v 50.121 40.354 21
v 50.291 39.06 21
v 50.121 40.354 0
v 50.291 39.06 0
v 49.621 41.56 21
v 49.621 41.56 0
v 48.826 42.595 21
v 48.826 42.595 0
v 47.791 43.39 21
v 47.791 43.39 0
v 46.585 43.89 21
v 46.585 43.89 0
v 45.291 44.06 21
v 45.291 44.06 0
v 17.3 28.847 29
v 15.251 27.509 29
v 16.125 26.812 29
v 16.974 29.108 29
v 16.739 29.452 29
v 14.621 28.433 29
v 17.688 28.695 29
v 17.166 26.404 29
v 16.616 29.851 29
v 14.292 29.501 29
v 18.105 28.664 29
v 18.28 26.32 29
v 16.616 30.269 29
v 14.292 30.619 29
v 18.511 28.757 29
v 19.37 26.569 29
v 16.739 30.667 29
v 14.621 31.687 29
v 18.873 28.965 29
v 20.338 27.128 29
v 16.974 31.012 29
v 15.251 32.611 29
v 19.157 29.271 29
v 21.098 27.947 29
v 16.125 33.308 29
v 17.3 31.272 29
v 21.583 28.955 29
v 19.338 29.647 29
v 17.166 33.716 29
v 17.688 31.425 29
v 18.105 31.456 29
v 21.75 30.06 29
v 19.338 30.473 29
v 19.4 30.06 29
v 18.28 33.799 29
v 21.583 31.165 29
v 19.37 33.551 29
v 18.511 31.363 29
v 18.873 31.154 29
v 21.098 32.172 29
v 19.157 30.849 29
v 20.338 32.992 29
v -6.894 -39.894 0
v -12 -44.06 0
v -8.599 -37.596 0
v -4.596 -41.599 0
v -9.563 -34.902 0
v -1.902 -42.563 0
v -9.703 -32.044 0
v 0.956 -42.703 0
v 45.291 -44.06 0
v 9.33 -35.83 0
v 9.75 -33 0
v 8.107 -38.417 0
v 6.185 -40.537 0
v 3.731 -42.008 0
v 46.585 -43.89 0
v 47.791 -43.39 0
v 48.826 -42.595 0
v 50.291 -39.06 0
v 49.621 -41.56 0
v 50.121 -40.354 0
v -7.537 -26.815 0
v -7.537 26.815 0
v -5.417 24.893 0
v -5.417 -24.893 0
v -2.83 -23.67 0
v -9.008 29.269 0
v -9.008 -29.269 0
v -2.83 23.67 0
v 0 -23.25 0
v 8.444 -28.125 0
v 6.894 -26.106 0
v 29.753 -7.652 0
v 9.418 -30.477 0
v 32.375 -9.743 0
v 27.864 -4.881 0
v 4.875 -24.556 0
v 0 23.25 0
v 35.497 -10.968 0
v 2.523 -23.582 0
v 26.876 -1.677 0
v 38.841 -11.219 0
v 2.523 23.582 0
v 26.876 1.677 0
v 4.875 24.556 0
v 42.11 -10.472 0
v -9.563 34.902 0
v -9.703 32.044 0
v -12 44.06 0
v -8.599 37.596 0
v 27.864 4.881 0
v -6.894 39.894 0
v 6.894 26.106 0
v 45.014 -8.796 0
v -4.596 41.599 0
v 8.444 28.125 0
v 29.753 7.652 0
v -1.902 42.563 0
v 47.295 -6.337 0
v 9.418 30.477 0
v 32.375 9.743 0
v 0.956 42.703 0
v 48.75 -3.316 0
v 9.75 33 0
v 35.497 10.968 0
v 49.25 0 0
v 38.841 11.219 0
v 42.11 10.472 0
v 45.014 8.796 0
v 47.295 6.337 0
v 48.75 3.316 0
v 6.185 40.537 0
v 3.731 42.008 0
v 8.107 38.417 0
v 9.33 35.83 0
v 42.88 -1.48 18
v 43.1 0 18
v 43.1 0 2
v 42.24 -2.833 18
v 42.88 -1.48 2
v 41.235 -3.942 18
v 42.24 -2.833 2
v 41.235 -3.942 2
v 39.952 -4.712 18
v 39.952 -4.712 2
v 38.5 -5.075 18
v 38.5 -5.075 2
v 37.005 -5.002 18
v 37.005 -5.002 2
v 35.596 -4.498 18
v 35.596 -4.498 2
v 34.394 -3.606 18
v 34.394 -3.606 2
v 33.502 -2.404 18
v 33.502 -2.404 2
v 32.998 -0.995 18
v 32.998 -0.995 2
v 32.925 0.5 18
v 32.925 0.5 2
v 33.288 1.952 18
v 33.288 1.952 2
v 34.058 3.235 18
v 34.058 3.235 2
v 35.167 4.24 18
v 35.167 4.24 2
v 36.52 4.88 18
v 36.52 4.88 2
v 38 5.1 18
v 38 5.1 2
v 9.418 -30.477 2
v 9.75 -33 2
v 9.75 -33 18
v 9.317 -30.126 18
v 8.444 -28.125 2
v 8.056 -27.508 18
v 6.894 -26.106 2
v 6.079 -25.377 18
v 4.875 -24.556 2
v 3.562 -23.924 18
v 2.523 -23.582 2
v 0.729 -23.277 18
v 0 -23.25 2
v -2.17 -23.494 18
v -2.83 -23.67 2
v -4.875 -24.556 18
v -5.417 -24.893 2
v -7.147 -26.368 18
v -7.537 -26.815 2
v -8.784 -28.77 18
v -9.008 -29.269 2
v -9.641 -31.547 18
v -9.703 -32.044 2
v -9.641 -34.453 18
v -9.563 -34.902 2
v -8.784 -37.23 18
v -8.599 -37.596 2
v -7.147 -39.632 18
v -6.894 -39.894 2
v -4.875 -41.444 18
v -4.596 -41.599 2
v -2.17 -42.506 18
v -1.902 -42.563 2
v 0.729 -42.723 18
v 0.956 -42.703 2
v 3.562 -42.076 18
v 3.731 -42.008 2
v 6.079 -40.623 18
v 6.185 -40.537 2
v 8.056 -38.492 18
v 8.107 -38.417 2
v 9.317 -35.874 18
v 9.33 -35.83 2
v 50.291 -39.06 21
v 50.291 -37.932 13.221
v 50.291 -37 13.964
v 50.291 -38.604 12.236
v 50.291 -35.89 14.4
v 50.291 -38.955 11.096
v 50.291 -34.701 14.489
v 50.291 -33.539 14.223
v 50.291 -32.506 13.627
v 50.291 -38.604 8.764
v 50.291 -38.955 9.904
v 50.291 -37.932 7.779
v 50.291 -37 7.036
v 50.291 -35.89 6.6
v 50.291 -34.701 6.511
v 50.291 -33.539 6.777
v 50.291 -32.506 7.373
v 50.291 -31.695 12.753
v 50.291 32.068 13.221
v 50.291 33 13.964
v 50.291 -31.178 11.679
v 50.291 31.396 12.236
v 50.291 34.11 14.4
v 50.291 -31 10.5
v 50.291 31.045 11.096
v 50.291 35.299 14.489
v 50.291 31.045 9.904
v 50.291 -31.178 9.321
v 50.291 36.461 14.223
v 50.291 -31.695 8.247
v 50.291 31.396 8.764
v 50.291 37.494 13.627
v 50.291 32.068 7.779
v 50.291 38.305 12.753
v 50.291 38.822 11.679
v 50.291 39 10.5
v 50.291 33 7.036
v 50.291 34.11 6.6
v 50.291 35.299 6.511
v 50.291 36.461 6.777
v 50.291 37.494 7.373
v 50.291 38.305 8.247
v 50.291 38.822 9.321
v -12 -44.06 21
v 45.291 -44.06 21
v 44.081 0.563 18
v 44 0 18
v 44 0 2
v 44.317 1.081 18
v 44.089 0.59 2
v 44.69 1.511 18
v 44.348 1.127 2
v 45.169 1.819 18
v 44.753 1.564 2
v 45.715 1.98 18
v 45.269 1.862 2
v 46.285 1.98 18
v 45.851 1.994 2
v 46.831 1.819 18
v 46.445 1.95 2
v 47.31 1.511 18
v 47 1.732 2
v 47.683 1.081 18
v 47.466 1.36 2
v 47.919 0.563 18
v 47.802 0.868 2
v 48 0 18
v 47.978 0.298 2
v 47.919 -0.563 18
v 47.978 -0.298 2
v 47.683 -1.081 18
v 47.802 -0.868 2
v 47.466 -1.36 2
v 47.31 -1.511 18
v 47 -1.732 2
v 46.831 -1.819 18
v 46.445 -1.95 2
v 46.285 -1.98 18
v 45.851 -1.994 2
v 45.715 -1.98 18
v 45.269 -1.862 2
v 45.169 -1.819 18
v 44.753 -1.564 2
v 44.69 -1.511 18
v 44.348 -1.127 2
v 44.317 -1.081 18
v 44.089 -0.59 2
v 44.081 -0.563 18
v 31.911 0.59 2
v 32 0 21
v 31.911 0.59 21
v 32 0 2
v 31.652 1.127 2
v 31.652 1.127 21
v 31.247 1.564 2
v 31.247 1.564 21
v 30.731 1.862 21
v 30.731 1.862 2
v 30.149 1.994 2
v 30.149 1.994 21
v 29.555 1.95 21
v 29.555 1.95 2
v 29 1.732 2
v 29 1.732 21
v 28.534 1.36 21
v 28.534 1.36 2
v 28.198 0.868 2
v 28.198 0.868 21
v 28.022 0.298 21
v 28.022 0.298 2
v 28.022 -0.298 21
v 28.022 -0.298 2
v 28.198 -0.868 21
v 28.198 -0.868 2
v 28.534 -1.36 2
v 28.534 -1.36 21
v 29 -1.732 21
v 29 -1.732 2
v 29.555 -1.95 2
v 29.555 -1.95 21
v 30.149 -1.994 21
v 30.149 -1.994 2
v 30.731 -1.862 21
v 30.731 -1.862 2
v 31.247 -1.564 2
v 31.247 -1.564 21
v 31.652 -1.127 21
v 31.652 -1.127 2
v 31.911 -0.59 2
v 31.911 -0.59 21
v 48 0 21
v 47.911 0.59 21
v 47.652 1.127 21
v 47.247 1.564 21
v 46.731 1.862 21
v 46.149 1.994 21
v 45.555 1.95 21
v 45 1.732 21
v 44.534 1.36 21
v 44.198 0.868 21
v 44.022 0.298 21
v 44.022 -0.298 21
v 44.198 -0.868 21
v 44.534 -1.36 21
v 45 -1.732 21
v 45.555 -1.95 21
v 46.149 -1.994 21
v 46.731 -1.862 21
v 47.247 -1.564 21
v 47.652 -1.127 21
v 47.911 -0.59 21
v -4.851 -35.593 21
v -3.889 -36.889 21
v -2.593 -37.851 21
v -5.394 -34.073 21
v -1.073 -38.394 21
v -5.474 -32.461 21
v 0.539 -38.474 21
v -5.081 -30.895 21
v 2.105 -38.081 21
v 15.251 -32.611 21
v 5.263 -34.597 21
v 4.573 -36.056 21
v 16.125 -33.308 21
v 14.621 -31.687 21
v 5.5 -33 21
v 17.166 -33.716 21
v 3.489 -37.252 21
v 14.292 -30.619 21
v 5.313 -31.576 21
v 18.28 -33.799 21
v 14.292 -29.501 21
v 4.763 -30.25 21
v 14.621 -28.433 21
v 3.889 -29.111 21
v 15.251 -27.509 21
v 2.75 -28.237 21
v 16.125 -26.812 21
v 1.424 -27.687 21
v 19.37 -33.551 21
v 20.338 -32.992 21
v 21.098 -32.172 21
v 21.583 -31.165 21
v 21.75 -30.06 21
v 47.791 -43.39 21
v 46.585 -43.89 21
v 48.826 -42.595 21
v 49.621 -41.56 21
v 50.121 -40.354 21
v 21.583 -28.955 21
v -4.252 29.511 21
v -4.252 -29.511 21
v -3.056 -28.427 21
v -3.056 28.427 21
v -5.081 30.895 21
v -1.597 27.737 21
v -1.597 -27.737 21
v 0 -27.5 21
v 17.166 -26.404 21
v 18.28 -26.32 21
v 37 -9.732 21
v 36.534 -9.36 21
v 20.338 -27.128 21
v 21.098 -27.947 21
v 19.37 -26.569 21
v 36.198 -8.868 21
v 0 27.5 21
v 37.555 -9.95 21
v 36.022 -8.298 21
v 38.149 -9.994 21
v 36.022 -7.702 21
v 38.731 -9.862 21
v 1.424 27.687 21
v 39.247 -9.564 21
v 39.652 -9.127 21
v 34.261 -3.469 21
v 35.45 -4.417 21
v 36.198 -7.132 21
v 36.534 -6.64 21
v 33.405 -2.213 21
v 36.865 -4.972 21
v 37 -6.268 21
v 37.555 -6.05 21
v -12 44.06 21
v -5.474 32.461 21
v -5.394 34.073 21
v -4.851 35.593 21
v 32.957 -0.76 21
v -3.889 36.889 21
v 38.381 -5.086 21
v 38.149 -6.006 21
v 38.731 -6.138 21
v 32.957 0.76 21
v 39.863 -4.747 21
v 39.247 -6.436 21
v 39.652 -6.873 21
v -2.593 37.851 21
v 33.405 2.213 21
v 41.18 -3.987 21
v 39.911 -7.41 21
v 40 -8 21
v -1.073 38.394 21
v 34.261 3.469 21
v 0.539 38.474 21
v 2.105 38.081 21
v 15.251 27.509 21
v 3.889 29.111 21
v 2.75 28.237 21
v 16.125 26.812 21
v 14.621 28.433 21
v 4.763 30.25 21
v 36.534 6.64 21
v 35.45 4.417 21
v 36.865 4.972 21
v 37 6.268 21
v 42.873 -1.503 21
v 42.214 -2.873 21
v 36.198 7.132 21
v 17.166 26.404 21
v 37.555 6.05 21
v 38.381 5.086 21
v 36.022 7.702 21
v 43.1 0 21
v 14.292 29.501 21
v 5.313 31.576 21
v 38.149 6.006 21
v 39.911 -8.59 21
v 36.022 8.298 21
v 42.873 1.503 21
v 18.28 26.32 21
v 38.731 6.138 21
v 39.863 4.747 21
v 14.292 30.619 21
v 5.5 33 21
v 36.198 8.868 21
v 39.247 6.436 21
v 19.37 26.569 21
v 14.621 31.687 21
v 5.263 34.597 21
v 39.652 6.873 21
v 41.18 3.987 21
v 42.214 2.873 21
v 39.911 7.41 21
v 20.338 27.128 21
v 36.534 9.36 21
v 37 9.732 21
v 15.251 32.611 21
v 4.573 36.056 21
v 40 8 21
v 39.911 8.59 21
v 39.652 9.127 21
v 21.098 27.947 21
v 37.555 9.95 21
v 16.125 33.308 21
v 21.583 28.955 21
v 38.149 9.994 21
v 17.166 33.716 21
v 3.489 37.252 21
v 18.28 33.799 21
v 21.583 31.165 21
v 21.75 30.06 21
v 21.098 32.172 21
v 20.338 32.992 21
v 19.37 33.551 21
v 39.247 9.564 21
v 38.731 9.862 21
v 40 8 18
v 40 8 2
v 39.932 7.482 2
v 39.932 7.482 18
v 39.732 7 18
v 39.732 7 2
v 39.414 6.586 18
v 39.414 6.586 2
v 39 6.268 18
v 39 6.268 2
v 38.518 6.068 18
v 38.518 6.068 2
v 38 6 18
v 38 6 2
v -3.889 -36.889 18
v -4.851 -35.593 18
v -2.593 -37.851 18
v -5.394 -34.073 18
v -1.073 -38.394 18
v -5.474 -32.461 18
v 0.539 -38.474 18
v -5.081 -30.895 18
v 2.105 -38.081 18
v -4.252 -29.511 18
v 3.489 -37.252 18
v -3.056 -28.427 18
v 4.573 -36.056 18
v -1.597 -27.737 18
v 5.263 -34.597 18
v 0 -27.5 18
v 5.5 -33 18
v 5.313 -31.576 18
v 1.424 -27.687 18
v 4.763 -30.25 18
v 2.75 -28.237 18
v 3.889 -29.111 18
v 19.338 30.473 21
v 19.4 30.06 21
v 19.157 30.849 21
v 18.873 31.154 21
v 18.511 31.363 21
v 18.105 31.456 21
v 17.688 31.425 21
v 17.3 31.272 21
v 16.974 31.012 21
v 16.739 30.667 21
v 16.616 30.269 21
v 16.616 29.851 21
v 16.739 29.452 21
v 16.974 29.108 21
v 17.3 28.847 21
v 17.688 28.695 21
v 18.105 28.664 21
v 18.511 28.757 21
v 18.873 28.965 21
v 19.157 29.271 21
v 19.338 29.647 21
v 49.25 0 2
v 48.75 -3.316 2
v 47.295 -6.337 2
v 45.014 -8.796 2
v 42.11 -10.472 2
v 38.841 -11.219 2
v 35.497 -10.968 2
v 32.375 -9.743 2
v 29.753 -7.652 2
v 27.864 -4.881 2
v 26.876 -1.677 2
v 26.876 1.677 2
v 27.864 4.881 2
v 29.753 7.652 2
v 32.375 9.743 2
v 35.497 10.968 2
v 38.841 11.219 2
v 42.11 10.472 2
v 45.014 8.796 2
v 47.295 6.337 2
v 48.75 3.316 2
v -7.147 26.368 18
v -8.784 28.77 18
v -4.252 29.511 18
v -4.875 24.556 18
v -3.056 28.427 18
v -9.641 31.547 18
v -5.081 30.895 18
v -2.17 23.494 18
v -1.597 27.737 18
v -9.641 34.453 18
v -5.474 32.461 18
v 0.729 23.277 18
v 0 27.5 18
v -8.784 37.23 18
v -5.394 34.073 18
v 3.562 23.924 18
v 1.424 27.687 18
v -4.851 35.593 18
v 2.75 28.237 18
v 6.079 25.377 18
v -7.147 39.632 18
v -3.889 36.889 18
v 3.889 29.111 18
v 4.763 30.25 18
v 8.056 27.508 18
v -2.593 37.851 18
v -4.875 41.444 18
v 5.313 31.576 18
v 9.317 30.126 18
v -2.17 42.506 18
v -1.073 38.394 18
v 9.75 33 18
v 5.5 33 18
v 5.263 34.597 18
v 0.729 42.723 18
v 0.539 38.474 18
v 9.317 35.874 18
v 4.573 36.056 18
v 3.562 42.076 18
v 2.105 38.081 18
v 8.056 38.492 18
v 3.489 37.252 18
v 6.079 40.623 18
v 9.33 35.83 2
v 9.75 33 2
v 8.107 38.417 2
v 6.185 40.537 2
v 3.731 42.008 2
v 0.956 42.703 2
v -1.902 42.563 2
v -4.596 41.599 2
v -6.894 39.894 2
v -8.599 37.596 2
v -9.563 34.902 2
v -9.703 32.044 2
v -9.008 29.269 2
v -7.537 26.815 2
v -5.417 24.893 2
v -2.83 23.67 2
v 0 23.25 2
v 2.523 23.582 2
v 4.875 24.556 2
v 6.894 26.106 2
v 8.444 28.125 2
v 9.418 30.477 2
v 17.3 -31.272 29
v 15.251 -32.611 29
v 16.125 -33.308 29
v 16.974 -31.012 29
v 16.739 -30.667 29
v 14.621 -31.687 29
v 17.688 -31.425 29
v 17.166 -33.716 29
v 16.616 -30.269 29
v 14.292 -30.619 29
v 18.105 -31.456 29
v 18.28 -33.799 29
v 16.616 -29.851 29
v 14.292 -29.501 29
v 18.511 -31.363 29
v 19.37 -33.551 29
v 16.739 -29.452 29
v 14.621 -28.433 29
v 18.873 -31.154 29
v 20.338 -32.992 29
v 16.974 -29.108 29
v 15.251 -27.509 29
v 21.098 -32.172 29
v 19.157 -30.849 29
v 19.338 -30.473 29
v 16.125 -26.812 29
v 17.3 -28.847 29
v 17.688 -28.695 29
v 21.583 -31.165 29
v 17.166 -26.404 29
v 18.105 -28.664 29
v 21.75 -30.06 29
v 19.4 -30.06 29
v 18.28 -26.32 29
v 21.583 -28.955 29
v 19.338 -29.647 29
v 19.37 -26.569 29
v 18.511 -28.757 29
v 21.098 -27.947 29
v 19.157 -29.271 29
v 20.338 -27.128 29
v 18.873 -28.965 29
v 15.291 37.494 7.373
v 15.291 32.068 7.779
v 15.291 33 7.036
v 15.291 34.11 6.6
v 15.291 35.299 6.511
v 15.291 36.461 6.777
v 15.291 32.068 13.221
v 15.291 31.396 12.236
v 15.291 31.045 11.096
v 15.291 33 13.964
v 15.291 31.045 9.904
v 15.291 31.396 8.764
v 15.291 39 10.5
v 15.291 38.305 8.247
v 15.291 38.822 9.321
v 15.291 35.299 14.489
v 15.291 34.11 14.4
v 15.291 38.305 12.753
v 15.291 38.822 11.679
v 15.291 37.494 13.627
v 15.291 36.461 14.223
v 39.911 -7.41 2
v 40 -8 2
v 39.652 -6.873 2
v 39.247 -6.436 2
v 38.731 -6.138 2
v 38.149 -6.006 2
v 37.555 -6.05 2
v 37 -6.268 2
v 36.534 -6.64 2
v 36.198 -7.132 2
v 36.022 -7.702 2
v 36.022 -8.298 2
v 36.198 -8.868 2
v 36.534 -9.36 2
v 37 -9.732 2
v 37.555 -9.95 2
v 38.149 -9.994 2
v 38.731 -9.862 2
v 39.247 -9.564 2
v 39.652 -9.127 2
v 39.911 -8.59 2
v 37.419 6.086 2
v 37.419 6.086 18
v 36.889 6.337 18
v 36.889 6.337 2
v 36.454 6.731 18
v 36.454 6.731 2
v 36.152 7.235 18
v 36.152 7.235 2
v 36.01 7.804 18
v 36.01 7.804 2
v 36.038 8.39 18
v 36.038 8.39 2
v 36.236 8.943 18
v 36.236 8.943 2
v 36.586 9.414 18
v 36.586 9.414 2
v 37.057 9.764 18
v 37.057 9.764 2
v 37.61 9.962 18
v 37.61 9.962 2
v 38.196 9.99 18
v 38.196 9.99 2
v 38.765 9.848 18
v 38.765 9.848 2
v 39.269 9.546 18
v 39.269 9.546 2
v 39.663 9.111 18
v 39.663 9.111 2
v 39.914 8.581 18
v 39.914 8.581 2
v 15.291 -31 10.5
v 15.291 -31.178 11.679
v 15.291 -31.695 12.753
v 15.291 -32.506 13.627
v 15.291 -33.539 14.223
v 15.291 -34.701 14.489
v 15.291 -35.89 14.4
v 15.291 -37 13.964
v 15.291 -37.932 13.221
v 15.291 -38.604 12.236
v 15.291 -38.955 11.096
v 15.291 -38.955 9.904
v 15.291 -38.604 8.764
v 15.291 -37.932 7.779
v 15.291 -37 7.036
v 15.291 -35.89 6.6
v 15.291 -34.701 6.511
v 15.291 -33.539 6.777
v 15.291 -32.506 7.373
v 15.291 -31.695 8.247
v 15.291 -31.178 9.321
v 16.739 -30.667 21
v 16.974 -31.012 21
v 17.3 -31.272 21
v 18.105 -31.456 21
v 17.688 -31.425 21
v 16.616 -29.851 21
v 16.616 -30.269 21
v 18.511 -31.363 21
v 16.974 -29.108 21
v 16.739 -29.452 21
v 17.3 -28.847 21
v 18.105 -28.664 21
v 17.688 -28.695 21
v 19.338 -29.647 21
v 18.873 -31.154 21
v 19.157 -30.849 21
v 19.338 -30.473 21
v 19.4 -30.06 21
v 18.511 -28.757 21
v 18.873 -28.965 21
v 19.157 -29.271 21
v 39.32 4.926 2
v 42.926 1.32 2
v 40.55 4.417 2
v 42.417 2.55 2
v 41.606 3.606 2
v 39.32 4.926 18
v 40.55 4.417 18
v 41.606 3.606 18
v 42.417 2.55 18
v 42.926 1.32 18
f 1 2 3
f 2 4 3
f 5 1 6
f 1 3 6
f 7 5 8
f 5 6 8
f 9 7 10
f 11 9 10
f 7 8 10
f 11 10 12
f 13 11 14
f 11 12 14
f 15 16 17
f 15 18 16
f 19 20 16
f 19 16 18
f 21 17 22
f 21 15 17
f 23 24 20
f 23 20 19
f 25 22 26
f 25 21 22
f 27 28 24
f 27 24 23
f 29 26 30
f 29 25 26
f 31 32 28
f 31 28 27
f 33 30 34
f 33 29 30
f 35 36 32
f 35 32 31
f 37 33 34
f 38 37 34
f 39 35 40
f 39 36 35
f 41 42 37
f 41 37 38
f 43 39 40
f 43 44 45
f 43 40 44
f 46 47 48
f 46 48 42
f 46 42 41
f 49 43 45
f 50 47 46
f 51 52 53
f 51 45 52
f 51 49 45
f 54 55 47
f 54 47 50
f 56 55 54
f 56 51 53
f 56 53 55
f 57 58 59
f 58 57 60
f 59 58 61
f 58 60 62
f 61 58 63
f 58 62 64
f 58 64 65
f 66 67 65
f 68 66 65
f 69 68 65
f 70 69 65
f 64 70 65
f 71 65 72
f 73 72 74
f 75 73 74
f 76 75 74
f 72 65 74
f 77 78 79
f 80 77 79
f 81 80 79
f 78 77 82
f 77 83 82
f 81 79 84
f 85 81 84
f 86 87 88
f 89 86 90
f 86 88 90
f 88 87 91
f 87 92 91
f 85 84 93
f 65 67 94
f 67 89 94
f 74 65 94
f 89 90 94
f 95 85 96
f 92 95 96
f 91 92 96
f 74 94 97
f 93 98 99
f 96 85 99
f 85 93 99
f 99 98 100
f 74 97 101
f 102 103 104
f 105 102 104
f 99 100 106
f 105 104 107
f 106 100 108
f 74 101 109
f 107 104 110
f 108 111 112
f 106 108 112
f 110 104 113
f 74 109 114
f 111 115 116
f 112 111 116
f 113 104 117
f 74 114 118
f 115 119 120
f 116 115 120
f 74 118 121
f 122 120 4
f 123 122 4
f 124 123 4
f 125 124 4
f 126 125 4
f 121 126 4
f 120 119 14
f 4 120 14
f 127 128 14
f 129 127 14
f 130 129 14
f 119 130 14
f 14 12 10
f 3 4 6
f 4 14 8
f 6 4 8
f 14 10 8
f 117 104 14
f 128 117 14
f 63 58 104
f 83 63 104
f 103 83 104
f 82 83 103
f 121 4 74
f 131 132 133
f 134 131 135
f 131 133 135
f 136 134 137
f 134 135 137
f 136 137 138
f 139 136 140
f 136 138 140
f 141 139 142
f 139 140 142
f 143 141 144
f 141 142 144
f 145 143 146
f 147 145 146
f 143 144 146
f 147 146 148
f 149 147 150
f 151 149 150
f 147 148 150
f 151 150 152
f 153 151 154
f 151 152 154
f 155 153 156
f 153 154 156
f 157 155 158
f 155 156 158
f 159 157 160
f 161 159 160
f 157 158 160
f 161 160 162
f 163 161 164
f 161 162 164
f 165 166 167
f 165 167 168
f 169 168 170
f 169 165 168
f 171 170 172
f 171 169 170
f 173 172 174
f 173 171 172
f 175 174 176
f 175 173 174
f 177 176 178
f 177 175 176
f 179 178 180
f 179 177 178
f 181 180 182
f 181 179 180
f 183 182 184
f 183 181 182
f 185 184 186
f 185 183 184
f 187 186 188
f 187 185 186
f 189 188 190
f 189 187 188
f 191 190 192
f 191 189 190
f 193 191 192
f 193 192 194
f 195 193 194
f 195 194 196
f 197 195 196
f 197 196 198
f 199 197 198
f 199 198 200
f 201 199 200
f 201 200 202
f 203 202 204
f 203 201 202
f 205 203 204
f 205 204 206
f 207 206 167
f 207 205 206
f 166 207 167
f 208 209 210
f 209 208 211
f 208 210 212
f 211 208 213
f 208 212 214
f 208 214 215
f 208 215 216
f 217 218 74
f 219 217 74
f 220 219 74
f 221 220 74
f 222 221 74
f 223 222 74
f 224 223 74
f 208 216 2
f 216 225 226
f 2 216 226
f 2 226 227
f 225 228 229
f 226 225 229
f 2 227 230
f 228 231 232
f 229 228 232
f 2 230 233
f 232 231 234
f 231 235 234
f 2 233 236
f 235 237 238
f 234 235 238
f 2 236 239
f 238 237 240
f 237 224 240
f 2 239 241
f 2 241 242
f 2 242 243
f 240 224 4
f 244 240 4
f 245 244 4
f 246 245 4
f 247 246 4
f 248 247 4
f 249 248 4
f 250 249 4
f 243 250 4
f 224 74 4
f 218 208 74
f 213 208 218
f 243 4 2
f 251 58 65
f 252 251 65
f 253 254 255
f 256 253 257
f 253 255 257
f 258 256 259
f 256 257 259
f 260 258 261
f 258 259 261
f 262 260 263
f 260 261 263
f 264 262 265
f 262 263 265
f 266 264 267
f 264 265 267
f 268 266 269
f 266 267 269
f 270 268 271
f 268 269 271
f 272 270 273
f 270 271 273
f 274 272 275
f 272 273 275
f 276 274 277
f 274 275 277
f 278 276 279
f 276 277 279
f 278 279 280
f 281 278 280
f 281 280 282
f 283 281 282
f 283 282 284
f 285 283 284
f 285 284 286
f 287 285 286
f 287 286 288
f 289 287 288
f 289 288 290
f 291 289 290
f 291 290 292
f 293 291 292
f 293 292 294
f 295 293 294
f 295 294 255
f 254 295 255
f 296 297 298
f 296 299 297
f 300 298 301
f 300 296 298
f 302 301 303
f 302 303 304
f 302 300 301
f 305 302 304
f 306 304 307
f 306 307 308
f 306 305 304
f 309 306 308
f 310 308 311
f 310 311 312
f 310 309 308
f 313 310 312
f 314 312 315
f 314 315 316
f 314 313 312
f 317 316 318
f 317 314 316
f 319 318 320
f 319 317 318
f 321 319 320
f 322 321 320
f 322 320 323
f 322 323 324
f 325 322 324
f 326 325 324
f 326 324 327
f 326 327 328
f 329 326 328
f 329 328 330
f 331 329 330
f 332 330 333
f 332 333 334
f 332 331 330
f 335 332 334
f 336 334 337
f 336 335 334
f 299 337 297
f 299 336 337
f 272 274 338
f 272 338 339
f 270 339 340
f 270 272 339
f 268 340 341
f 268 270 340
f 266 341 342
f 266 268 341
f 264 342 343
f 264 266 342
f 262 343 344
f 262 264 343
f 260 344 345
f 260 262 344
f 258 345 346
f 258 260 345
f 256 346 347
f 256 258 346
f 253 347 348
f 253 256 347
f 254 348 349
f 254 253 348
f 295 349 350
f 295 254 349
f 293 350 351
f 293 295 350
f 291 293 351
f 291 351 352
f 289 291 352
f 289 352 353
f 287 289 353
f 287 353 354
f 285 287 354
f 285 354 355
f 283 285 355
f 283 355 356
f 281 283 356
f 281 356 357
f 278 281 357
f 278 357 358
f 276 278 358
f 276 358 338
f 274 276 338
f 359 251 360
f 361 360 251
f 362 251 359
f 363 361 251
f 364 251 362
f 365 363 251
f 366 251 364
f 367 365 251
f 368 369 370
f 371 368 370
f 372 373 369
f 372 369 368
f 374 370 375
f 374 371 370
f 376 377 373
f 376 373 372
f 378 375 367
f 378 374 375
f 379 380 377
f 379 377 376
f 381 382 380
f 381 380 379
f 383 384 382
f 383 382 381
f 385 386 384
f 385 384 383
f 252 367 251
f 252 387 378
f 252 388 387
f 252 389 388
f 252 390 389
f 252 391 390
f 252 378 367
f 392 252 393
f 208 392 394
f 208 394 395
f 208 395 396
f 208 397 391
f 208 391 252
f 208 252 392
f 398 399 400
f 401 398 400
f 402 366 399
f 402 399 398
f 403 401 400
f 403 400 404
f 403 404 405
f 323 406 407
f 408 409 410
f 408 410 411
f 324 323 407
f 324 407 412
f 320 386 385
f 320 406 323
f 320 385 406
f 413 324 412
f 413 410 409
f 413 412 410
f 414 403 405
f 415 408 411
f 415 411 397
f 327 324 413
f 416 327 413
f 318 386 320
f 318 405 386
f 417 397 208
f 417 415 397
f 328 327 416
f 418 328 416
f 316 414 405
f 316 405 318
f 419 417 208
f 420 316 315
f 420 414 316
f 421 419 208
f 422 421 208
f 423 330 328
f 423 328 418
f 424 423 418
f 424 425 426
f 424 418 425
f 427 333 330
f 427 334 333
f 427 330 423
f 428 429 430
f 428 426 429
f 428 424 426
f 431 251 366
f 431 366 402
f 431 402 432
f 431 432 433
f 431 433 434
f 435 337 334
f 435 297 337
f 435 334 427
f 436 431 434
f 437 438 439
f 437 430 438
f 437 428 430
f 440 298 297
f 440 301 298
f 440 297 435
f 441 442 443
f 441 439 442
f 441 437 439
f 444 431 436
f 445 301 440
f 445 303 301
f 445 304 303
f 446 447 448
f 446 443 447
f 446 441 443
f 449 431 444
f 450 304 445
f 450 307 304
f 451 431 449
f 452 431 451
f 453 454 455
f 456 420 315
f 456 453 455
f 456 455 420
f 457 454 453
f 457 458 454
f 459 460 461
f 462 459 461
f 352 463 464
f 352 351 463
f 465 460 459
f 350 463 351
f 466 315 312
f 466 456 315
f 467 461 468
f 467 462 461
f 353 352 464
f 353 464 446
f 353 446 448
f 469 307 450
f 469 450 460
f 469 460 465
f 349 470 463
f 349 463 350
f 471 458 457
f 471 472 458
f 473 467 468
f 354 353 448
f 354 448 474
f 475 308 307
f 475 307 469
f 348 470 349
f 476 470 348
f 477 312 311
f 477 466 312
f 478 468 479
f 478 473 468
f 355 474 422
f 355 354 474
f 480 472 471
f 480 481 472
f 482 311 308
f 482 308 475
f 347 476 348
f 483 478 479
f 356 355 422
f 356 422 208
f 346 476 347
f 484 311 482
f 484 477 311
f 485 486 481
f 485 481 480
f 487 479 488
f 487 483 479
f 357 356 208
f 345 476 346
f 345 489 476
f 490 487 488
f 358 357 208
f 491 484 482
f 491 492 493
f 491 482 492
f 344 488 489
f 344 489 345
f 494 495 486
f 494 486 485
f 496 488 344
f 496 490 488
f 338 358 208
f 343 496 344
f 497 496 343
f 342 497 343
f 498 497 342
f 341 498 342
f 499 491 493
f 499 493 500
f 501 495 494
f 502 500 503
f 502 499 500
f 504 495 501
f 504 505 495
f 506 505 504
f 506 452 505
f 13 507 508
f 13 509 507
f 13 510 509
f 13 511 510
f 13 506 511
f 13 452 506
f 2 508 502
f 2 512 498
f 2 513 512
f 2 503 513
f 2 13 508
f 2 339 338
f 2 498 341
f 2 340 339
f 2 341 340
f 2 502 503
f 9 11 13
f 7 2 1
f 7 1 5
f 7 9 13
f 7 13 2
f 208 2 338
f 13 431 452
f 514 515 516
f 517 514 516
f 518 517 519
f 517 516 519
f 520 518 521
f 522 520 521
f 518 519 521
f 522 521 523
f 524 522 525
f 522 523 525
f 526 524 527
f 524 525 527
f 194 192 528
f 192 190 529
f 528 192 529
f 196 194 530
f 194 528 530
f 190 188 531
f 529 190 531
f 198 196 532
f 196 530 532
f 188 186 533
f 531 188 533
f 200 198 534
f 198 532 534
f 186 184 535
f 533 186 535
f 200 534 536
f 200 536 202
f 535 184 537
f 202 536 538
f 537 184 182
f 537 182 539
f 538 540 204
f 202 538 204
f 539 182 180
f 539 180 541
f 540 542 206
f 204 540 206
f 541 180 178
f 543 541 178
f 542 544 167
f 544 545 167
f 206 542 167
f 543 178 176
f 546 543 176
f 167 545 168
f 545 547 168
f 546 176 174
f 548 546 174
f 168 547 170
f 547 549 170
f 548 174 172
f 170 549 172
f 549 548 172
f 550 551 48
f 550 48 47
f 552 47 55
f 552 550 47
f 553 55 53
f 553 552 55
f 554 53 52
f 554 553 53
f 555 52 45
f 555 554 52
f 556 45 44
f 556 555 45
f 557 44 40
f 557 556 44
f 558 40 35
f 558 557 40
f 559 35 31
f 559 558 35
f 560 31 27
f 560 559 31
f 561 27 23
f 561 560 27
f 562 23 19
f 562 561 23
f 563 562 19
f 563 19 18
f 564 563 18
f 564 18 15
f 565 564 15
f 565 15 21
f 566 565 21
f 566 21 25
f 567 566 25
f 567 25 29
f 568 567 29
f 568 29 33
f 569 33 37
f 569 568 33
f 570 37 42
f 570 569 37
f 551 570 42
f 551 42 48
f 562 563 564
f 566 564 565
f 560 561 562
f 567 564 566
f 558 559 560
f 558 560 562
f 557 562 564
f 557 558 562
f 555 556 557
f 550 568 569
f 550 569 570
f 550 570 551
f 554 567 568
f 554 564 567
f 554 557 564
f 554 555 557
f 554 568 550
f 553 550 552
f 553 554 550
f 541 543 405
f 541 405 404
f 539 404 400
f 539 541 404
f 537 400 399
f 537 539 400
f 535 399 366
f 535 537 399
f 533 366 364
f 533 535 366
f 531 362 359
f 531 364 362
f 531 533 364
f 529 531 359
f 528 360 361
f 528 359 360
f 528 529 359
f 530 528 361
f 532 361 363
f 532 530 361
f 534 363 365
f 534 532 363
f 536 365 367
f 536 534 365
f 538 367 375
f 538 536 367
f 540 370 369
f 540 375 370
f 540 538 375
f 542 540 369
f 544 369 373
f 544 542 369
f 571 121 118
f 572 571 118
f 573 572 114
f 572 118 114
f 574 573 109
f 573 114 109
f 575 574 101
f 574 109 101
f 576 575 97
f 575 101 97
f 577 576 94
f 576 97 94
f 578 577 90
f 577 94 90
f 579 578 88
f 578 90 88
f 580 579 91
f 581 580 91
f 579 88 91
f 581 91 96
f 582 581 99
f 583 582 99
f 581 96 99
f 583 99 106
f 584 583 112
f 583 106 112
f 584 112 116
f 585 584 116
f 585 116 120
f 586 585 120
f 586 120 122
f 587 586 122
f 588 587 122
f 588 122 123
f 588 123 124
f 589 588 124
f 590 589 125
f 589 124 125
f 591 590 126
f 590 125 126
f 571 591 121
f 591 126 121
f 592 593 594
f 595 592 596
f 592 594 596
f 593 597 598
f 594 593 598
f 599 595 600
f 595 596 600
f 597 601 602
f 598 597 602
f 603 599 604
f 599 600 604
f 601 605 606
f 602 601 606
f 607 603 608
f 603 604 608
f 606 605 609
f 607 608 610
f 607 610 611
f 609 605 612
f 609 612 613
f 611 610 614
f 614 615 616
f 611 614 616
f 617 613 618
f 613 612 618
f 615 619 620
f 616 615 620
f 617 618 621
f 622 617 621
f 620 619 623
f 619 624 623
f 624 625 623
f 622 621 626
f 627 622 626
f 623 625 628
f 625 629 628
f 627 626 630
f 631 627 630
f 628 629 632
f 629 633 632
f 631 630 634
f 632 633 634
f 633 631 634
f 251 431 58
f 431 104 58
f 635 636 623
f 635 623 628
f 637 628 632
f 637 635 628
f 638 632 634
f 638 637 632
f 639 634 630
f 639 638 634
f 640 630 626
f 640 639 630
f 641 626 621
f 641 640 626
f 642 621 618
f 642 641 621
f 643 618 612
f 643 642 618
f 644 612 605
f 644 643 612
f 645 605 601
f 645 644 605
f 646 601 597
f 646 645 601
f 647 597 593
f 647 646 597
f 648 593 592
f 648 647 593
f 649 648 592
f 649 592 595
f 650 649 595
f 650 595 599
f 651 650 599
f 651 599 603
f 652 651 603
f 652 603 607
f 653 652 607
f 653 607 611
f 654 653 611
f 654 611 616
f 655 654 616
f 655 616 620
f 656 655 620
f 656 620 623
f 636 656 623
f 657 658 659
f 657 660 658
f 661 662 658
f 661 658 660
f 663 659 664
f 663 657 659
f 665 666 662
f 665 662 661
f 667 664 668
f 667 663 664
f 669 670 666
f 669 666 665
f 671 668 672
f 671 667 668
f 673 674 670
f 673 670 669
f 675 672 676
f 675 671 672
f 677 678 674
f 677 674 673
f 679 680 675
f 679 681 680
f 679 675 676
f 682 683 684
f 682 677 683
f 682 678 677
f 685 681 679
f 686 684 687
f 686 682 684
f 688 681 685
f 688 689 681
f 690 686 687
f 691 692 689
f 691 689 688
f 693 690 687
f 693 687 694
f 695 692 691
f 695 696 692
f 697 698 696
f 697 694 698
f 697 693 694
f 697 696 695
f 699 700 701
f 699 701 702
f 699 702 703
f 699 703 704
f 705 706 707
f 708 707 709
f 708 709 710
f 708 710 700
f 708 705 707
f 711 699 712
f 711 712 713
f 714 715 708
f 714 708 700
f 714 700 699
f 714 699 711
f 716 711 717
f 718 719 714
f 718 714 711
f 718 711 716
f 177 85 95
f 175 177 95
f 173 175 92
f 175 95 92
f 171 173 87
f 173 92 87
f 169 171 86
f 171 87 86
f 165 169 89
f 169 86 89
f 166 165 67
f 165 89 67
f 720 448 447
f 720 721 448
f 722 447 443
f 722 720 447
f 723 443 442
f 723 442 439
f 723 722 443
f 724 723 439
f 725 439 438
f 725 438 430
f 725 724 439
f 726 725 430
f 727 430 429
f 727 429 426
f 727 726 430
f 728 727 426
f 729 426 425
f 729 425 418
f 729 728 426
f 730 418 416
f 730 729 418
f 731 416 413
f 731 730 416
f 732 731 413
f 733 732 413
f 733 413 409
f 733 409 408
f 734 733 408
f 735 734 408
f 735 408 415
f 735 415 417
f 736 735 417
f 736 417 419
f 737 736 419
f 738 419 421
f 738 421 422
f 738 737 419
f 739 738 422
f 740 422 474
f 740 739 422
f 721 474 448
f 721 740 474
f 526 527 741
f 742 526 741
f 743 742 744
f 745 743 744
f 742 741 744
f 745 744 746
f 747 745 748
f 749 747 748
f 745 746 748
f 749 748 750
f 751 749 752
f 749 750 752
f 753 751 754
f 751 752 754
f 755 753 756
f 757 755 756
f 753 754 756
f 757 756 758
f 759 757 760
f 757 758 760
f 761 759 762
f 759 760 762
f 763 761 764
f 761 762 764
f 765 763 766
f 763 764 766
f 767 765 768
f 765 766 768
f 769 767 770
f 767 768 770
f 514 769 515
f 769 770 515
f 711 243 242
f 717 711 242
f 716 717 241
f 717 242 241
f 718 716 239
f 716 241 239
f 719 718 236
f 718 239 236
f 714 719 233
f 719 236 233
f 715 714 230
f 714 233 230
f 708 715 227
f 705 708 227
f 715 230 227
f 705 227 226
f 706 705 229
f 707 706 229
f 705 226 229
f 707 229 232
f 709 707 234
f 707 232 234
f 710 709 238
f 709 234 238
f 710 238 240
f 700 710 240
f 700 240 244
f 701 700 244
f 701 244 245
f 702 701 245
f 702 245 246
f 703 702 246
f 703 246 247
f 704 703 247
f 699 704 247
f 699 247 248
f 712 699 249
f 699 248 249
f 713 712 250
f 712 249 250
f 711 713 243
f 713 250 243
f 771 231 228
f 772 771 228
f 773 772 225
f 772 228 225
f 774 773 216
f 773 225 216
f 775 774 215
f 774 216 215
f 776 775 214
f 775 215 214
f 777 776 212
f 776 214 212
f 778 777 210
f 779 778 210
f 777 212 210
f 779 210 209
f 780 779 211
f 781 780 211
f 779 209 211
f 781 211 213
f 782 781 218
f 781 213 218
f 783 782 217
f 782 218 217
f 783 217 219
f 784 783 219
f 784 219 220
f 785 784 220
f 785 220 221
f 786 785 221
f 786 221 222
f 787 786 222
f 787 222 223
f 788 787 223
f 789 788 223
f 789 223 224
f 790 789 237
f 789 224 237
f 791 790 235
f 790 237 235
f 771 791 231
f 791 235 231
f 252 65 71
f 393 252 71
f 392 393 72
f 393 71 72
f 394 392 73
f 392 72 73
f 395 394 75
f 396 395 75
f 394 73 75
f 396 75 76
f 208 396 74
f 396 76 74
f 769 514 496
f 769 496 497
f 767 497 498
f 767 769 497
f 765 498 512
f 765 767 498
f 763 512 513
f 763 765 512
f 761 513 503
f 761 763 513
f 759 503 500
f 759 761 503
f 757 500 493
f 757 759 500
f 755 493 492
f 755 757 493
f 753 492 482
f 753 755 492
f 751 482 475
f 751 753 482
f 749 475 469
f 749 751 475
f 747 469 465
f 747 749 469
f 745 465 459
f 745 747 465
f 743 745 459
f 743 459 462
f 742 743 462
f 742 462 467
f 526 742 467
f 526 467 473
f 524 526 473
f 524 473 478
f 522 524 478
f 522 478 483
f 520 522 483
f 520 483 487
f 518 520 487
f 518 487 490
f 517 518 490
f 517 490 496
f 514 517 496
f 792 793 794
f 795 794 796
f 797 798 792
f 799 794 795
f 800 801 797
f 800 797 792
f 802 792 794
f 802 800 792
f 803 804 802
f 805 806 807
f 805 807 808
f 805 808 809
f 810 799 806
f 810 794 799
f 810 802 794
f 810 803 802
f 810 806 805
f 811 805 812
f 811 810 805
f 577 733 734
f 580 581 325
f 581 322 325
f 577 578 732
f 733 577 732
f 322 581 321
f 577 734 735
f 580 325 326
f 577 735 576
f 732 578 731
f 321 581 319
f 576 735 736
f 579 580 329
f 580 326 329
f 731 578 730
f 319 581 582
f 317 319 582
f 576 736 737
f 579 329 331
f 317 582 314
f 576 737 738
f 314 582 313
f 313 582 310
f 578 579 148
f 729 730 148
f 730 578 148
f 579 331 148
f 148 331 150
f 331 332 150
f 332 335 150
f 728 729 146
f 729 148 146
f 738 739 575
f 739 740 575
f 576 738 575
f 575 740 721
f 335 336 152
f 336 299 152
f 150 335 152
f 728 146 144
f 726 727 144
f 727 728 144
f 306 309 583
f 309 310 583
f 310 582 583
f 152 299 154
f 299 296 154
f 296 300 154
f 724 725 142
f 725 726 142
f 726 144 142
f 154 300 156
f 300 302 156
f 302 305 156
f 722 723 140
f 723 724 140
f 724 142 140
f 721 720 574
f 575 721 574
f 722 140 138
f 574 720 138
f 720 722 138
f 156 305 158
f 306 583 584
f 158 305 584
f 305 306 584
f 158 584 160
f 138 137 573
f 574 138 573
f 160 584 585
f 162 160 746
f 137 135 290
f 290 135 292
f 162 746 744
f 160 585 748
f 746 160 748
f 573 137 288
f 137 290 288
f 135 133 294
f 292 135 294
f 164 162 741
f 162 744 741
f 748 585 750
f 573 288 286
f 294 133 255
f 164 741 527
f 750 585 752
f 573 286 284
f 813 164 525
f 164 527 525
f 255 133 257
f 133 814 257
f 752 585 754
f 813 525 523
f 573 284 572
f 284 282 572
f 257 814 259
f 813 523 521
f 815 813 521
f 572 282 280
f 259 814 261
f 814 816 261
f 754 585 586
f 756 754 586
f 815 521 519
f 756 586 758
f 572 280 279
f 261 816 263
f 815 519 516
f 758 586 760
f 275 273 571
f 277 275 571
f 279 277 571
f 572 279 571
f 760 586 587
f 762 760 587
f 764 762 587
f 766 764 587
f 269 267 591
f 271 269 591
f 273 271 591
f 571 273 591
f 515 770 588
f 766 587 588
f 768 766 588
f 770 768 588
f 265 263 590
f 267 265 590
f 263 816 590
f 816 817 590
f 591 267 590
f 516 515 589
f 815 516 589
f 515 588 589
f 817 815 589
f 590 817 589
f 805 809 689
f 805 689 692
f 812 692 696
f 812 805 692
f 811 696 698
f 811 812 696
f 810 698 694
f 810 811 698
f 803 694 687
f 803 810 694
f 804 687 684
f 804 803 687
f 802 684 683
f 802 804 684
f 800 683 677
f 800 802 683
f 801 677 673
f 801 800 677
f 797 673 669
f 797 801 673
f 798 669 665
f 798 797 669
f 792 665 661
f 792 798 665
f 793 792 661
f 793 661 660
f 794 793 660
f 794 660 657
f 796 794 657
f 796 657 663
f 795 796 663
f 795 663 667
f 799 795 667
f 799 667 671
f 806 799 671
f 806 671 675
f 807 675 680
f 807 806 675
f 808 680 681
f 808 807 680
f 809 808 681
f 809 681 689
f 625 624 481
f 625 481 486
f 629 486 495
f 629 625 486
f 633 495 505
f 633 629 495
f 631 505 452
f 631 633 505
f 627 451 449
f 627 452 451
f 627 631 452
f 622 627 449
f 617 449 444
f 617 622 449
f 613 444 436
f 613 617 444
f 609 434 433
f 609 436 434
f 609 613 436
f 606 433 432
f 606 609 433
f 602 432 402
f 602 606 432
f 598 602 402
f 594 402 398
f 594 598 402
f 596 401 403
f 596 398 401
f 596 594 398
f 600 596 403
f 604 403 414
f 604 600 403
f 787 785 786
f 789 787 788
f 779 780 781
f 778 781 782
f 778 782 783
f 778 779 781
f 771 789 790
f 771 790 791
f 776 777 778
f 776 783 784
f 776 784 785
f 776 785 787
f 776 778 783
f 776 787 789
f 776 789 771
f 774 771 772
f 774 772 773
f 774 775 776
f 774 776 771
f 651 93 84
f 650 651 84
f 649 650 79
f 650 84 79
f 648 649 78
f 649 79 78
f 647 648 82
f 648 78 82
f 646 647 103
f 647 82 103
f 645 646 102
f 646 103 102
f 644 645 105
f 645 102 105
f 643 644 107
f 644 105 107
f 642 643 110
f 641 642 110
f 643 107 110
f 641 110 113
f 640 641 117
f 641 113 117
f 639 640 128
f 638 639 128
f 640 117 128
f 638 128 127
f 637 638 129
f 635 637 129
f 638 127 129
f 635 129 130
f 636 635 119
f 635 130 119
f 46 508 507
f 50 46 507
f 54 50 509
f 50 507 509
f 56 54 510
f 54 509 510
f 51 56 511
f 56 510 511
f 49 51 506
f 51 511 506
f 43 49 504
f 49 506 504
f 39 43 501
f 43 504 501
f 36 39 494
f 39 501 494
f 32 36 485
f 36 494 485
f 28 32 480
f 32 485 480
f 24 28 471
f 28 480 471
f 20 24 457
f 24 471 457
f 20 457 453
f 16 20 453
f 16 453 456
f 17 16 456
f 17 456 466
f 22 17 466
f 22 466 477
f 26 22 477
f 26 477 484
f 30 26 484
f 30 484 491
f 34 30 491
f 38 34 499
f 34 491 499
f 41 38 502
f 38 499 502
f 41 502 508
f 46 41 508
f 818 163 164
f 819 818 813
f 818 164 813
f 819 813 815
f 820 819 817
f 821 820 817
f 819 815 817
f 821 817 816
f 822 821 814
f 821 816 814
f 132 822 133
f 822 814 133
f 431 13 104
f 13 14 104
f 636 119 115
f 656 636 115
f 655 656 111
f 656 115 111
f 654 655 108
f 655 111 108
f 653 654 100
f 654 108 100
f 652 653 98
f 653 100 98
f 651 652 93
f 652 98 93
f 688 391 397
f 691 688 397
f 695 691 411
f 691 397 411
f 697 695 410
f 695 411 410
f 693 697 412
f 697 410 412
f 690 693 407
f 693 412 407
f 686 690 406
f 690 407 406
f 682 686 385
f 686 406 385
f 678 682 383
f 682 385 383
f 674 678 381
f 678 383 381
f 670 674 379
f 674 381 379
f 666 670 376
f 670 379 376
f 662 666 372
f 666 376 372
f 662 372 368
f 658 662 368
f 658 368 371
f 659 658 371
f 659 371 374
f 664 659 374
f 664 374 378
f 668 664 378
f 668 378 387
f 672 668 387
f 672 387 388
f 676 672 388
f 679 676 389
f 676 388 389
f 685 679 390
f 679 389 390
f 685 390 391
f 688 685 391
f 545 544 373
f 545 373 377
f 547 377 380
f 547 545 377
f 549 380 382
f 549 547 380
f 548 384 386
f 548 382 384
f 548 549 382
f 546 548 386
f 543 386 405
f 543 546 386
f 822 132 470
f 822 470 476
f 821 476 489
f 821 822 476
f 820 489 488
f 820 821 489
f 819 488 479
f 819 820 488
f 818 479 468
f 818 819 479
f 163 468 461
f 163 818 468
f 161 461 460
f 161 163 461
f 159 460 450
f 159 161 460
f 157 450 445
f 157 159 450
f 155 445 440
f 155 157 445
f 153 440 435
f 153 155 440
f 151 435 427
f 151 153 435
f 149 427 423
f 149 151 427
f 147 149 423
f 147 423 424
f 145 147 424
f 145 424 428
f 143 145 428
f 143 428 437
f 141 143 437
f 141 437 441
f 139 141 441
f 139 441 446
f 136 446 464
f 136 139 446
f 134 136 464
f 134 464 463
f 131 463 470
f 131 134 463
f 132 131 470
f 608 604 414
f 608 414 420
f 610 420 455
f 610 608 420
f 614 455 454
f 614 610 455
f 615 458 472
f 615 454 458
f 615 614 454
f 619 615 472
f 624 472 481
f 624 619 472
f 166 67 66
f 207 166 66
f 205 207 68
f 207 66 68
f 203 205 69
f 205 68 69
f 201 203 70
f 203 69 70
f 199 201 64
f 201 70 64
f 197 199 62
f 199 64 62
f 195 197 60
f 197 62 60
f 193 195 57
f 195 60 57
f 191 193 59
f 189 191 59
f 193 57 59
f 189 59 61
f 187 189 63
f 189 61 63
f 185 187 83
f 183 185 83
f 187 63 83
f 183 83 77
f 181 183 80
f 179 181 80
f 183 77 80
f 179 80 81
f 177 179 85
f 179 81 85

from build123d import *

# Parameters (mm, degrees)
F1_DEPTH  = 2
F2_R      = 9.75
F2_R_2    = 11.25
F2_R_3    = 2
F3_DEPTH  = 16
F4_R      = 9.75
F4_R_2    = 2
F4_R_3    = 5.1
F5_DEPTH  = 3
F7_DEPTH  = 40
F6_R      = 4
F8_DEPTH  = 35
F9_R      = 3.75
F9_R_2    = 1.4
F10_DEPTH = 8


# Not quite as in the source:
# - after a boolean that leaves OpenCascade's solid faulty, fix() repairs it
# - a feature names something its author has since deleted; it is built from what else it names


with BuildPart() as f1:
    # F0 (on Top) → F1 (new body)
    with BuildSketch(Plane.XY):
        with BuildLine():
            Line((50.2909459174, -23.5600714934), (50.2909459174, 23.5599285066))
            Line((50.2909459174, 23.5599285066), (50.2909459174, 39.0599285066))
            ThreePointArc((50.2909459174, 39.0599285066), (48.8264798233, 42.5954624125), (45.2909459174, 44.0599285066))
            Line((45.2909459174, 44.0599285066), (-12, 44.0599285066))
            Line((-12, 44.0599285066), (-12, 0))
            Line((-12, 0), (-12, -44.0599285066))
            Line((-12, -44.0599285066), (45.2909459174, -44.0599285066))
            ThreePointArc((45.2909459174, -44.0599285066), (48.8264798233, -42.5954624125), (50.2909459174, -39.0599285066))
            Line((50.2909459174, -39.0599285066), (50.2909459174, -23.5600714934))
        make_face()
        with BuildLine():
            ThreePointArc((9.75, -33), (-6.8942911166, -39.8942911166), (0, -23.25))
            ThreePointArc((0, -23.25), (6.8942911166, -26.1057088834), (9.75, -33))
        make_face(mode=Mode.SUBTRACT)
        with BuildLine():
            ThreePointArc((9.75, 33), (6.8942911166, 26.1057088834), (0, 23.25))
            ThreePointArc((0, 23.25), (-6.8942911166, 39.8942911166), (9.75, 33))
        make_face(mode=Mode.SUBTRACT)
        with BuildLine():
            ThreePointArc((26.75, 0), (38, 11.25), (49.25, 0))
            ThreePointArc((49.25, 0), (38, -11.25), (26.75, 0))
        make_face(mode=Mode.SUBTRACT)
    extrude(amount=F1_DEPTH)

    # F2 (on face) → F3 (join)
    with BuildSketch(Plane.XY.offset(2)):
        with BuildLine():
            ThreePointArc((50.2909459174, 39.0599285066), (48.8264798233, 42.5954624125), (45.2909459174, 44.0599285066))
            Line((45.2909459174, 44.0599285066), (-12, 44.0599285066))
            Line((-12, 44.0599285066), (-12, -44.0599285066))
            Line((-12, -44.0599285066), (45.2909459174, -44.0599285066))
            ThreePointArc((45.2909459174, -44.0599285066), (48.8264798233, -42.5954624125), (50.2909459174, -39.0599285066))
            Line((50.2909459174, -39.0599285066), (50.2909459174, 39.0599285066))
        make_face()
        with Locations((0, -33)):
            Circle(F2_R, mode=Mode.SUBTRACT)
        with Locations((0, 33)):
            Circle(F2_R, mode=Mode.SUBTRACT)
        with Locations((38, 0)):
            Circle(F2_R_2, mode=Mode.SUBTRACT)
        with Locations((38, 0)):
            Circle(F2_R_2)
        with Locations((38, -8)):
            Circle(F2_R_3, mode=Mode.SUBTRACT)
        with Locations((30, 0)):
            Circle(F2_R_3, mode=Mode.SUBTRACT)
        with BuildLine():
            ThreePointArc((38, 5.1), (41.6062445841, 3.6062445841), (43.1, 0))
            ThreePointArc((43.1, 0), (34.3937554159, -3.6062445841), (38, 5.1))
        make_face(mode=Mode.SUBTRACT)
        with BuildLine():
            ThreePointArc((40, 8), (39.4142135624, 6.5857864376), (38, 6))
            ThreePointArc((38, 6), (36.5857864376, 9.4142135624), (40, 8))
        make_face(mode=Mode.SUBTRACT)
        with BuildLine():
            ThreePointArc((48, 0), (46, -2), (44, 0))
            ThreePointArc((44, 0), (46, 2), (48, 0))
        make_face(mode=Mode.SUBTRACT)
    extrude(amount=F3_DEPTH)

    # F4 (on face) → F5 (join)
    with BuildSketch(Plane.XY.offset(18)):
        with BuildLine():
            Line((50.2909459174, -39.0599285066), (50.2909459174, 39.0599285066))
            ThreePointArc((50.2909459174, 39.0599285066), (48.8264798233, 42.5954624125), (45.2909459174, 44.0599285066))
            Line((45.2909459174, 44.0599285066), (-12, 44.0599285066))
            Line((-12, 44.0599285066), (-12, -44.0599285066))
            Line((-12, -44.0599285066), (45.2909459174, -44.0599285066))
            ThreePointArc((45.2909459174, -44.0599285066), (48.8264798233, -42.5954624125), (50.2909459174, -39.0599285066))
        make_face()
        with Locations((0, -33)):
            Circle(F4_R, mode=Mode.SUBTRACT)
        with Locations((38, -8)):
            Circle(F4_R_2, mode=Mode.SUBTRACT)
        with Locations((0, 33)):
            Circle(F4_R, mode=Mode.SUBTRACT)
        with Locations((30, 0)):
            Circle(F4_R_2, mode=Mode.SUBTRACT)
        with Locations((38, 0)):
            Circle(F4_R_3, mode=Mode.SUBTRACT)
        with Locations((38, 8)):
            Circle(F4_R_2, mode=Mode.SUBTRACT)
        with Locations((46, 0)):
            Circle(F4_R_2, mode=Mode.SUBTRACT)
        with Locations((0, -33)):
            Circle(F4_R)
        with Locations((0, 33)):
            Circle(F4_R)
    extrude(amount=F5_DEPTH)

    # F0 (on Top) → F7 (cut)
    with BuildSketch(Plane.XY):
        with BuildLine():
            ThreePointArc((5.5, -33), (3.8890872965, -29.1109127035), (0, -27.5))
            ThreePointArc((0, -27.5), (-3.8890872965, -36.8890872965), (5.5, -33))
        make_face()
        with BuildLine():
            ThreePointArc((5.5, 33), (-3.8890872965, 36.8890872965), (0, 27.5))
            ThreePointArc((0, 27.5), (3.8890872965, 29.1109127035), (5.5, 33))
        make_face()
    extrude(amount=F7_DEPTH, mode=Mode.SUBTRACT)

    add(f1.part.fix(), mode=Mode.REPLACE)

    # F6 (on face) → F8 (cut)
    with BuildSketch(Plane.YZ.offset(50.2909459174)):
        with Locations((35, 10.5)):
            Circle(F6_R)
        with Locations((-35, 10.5)):
            Circle(F6_R)
    extrude(amount=-F8_DEPTH, mode=Mode.SUBTRACT)

    # F9 (on face) → F10 (join)
    with BuildSketch(Plane.XY.offset(21)):
        with Locations((18, -30.0599285066)):
            Circle(F9_R)
        with Locations((18, -30.0599285066)):
            Circle(F9_R_2, mode=Mode.SUBTRACT)
        with Locations((18, 30.0599285066)):
            Circle(F9_R)
        with Locations((18, 30.0599285066)):
            Circle(F9_R_2, mode=Mode.SUBTRACT)
    extrude(amount=F10_DEPTH)


solid = f1.part
